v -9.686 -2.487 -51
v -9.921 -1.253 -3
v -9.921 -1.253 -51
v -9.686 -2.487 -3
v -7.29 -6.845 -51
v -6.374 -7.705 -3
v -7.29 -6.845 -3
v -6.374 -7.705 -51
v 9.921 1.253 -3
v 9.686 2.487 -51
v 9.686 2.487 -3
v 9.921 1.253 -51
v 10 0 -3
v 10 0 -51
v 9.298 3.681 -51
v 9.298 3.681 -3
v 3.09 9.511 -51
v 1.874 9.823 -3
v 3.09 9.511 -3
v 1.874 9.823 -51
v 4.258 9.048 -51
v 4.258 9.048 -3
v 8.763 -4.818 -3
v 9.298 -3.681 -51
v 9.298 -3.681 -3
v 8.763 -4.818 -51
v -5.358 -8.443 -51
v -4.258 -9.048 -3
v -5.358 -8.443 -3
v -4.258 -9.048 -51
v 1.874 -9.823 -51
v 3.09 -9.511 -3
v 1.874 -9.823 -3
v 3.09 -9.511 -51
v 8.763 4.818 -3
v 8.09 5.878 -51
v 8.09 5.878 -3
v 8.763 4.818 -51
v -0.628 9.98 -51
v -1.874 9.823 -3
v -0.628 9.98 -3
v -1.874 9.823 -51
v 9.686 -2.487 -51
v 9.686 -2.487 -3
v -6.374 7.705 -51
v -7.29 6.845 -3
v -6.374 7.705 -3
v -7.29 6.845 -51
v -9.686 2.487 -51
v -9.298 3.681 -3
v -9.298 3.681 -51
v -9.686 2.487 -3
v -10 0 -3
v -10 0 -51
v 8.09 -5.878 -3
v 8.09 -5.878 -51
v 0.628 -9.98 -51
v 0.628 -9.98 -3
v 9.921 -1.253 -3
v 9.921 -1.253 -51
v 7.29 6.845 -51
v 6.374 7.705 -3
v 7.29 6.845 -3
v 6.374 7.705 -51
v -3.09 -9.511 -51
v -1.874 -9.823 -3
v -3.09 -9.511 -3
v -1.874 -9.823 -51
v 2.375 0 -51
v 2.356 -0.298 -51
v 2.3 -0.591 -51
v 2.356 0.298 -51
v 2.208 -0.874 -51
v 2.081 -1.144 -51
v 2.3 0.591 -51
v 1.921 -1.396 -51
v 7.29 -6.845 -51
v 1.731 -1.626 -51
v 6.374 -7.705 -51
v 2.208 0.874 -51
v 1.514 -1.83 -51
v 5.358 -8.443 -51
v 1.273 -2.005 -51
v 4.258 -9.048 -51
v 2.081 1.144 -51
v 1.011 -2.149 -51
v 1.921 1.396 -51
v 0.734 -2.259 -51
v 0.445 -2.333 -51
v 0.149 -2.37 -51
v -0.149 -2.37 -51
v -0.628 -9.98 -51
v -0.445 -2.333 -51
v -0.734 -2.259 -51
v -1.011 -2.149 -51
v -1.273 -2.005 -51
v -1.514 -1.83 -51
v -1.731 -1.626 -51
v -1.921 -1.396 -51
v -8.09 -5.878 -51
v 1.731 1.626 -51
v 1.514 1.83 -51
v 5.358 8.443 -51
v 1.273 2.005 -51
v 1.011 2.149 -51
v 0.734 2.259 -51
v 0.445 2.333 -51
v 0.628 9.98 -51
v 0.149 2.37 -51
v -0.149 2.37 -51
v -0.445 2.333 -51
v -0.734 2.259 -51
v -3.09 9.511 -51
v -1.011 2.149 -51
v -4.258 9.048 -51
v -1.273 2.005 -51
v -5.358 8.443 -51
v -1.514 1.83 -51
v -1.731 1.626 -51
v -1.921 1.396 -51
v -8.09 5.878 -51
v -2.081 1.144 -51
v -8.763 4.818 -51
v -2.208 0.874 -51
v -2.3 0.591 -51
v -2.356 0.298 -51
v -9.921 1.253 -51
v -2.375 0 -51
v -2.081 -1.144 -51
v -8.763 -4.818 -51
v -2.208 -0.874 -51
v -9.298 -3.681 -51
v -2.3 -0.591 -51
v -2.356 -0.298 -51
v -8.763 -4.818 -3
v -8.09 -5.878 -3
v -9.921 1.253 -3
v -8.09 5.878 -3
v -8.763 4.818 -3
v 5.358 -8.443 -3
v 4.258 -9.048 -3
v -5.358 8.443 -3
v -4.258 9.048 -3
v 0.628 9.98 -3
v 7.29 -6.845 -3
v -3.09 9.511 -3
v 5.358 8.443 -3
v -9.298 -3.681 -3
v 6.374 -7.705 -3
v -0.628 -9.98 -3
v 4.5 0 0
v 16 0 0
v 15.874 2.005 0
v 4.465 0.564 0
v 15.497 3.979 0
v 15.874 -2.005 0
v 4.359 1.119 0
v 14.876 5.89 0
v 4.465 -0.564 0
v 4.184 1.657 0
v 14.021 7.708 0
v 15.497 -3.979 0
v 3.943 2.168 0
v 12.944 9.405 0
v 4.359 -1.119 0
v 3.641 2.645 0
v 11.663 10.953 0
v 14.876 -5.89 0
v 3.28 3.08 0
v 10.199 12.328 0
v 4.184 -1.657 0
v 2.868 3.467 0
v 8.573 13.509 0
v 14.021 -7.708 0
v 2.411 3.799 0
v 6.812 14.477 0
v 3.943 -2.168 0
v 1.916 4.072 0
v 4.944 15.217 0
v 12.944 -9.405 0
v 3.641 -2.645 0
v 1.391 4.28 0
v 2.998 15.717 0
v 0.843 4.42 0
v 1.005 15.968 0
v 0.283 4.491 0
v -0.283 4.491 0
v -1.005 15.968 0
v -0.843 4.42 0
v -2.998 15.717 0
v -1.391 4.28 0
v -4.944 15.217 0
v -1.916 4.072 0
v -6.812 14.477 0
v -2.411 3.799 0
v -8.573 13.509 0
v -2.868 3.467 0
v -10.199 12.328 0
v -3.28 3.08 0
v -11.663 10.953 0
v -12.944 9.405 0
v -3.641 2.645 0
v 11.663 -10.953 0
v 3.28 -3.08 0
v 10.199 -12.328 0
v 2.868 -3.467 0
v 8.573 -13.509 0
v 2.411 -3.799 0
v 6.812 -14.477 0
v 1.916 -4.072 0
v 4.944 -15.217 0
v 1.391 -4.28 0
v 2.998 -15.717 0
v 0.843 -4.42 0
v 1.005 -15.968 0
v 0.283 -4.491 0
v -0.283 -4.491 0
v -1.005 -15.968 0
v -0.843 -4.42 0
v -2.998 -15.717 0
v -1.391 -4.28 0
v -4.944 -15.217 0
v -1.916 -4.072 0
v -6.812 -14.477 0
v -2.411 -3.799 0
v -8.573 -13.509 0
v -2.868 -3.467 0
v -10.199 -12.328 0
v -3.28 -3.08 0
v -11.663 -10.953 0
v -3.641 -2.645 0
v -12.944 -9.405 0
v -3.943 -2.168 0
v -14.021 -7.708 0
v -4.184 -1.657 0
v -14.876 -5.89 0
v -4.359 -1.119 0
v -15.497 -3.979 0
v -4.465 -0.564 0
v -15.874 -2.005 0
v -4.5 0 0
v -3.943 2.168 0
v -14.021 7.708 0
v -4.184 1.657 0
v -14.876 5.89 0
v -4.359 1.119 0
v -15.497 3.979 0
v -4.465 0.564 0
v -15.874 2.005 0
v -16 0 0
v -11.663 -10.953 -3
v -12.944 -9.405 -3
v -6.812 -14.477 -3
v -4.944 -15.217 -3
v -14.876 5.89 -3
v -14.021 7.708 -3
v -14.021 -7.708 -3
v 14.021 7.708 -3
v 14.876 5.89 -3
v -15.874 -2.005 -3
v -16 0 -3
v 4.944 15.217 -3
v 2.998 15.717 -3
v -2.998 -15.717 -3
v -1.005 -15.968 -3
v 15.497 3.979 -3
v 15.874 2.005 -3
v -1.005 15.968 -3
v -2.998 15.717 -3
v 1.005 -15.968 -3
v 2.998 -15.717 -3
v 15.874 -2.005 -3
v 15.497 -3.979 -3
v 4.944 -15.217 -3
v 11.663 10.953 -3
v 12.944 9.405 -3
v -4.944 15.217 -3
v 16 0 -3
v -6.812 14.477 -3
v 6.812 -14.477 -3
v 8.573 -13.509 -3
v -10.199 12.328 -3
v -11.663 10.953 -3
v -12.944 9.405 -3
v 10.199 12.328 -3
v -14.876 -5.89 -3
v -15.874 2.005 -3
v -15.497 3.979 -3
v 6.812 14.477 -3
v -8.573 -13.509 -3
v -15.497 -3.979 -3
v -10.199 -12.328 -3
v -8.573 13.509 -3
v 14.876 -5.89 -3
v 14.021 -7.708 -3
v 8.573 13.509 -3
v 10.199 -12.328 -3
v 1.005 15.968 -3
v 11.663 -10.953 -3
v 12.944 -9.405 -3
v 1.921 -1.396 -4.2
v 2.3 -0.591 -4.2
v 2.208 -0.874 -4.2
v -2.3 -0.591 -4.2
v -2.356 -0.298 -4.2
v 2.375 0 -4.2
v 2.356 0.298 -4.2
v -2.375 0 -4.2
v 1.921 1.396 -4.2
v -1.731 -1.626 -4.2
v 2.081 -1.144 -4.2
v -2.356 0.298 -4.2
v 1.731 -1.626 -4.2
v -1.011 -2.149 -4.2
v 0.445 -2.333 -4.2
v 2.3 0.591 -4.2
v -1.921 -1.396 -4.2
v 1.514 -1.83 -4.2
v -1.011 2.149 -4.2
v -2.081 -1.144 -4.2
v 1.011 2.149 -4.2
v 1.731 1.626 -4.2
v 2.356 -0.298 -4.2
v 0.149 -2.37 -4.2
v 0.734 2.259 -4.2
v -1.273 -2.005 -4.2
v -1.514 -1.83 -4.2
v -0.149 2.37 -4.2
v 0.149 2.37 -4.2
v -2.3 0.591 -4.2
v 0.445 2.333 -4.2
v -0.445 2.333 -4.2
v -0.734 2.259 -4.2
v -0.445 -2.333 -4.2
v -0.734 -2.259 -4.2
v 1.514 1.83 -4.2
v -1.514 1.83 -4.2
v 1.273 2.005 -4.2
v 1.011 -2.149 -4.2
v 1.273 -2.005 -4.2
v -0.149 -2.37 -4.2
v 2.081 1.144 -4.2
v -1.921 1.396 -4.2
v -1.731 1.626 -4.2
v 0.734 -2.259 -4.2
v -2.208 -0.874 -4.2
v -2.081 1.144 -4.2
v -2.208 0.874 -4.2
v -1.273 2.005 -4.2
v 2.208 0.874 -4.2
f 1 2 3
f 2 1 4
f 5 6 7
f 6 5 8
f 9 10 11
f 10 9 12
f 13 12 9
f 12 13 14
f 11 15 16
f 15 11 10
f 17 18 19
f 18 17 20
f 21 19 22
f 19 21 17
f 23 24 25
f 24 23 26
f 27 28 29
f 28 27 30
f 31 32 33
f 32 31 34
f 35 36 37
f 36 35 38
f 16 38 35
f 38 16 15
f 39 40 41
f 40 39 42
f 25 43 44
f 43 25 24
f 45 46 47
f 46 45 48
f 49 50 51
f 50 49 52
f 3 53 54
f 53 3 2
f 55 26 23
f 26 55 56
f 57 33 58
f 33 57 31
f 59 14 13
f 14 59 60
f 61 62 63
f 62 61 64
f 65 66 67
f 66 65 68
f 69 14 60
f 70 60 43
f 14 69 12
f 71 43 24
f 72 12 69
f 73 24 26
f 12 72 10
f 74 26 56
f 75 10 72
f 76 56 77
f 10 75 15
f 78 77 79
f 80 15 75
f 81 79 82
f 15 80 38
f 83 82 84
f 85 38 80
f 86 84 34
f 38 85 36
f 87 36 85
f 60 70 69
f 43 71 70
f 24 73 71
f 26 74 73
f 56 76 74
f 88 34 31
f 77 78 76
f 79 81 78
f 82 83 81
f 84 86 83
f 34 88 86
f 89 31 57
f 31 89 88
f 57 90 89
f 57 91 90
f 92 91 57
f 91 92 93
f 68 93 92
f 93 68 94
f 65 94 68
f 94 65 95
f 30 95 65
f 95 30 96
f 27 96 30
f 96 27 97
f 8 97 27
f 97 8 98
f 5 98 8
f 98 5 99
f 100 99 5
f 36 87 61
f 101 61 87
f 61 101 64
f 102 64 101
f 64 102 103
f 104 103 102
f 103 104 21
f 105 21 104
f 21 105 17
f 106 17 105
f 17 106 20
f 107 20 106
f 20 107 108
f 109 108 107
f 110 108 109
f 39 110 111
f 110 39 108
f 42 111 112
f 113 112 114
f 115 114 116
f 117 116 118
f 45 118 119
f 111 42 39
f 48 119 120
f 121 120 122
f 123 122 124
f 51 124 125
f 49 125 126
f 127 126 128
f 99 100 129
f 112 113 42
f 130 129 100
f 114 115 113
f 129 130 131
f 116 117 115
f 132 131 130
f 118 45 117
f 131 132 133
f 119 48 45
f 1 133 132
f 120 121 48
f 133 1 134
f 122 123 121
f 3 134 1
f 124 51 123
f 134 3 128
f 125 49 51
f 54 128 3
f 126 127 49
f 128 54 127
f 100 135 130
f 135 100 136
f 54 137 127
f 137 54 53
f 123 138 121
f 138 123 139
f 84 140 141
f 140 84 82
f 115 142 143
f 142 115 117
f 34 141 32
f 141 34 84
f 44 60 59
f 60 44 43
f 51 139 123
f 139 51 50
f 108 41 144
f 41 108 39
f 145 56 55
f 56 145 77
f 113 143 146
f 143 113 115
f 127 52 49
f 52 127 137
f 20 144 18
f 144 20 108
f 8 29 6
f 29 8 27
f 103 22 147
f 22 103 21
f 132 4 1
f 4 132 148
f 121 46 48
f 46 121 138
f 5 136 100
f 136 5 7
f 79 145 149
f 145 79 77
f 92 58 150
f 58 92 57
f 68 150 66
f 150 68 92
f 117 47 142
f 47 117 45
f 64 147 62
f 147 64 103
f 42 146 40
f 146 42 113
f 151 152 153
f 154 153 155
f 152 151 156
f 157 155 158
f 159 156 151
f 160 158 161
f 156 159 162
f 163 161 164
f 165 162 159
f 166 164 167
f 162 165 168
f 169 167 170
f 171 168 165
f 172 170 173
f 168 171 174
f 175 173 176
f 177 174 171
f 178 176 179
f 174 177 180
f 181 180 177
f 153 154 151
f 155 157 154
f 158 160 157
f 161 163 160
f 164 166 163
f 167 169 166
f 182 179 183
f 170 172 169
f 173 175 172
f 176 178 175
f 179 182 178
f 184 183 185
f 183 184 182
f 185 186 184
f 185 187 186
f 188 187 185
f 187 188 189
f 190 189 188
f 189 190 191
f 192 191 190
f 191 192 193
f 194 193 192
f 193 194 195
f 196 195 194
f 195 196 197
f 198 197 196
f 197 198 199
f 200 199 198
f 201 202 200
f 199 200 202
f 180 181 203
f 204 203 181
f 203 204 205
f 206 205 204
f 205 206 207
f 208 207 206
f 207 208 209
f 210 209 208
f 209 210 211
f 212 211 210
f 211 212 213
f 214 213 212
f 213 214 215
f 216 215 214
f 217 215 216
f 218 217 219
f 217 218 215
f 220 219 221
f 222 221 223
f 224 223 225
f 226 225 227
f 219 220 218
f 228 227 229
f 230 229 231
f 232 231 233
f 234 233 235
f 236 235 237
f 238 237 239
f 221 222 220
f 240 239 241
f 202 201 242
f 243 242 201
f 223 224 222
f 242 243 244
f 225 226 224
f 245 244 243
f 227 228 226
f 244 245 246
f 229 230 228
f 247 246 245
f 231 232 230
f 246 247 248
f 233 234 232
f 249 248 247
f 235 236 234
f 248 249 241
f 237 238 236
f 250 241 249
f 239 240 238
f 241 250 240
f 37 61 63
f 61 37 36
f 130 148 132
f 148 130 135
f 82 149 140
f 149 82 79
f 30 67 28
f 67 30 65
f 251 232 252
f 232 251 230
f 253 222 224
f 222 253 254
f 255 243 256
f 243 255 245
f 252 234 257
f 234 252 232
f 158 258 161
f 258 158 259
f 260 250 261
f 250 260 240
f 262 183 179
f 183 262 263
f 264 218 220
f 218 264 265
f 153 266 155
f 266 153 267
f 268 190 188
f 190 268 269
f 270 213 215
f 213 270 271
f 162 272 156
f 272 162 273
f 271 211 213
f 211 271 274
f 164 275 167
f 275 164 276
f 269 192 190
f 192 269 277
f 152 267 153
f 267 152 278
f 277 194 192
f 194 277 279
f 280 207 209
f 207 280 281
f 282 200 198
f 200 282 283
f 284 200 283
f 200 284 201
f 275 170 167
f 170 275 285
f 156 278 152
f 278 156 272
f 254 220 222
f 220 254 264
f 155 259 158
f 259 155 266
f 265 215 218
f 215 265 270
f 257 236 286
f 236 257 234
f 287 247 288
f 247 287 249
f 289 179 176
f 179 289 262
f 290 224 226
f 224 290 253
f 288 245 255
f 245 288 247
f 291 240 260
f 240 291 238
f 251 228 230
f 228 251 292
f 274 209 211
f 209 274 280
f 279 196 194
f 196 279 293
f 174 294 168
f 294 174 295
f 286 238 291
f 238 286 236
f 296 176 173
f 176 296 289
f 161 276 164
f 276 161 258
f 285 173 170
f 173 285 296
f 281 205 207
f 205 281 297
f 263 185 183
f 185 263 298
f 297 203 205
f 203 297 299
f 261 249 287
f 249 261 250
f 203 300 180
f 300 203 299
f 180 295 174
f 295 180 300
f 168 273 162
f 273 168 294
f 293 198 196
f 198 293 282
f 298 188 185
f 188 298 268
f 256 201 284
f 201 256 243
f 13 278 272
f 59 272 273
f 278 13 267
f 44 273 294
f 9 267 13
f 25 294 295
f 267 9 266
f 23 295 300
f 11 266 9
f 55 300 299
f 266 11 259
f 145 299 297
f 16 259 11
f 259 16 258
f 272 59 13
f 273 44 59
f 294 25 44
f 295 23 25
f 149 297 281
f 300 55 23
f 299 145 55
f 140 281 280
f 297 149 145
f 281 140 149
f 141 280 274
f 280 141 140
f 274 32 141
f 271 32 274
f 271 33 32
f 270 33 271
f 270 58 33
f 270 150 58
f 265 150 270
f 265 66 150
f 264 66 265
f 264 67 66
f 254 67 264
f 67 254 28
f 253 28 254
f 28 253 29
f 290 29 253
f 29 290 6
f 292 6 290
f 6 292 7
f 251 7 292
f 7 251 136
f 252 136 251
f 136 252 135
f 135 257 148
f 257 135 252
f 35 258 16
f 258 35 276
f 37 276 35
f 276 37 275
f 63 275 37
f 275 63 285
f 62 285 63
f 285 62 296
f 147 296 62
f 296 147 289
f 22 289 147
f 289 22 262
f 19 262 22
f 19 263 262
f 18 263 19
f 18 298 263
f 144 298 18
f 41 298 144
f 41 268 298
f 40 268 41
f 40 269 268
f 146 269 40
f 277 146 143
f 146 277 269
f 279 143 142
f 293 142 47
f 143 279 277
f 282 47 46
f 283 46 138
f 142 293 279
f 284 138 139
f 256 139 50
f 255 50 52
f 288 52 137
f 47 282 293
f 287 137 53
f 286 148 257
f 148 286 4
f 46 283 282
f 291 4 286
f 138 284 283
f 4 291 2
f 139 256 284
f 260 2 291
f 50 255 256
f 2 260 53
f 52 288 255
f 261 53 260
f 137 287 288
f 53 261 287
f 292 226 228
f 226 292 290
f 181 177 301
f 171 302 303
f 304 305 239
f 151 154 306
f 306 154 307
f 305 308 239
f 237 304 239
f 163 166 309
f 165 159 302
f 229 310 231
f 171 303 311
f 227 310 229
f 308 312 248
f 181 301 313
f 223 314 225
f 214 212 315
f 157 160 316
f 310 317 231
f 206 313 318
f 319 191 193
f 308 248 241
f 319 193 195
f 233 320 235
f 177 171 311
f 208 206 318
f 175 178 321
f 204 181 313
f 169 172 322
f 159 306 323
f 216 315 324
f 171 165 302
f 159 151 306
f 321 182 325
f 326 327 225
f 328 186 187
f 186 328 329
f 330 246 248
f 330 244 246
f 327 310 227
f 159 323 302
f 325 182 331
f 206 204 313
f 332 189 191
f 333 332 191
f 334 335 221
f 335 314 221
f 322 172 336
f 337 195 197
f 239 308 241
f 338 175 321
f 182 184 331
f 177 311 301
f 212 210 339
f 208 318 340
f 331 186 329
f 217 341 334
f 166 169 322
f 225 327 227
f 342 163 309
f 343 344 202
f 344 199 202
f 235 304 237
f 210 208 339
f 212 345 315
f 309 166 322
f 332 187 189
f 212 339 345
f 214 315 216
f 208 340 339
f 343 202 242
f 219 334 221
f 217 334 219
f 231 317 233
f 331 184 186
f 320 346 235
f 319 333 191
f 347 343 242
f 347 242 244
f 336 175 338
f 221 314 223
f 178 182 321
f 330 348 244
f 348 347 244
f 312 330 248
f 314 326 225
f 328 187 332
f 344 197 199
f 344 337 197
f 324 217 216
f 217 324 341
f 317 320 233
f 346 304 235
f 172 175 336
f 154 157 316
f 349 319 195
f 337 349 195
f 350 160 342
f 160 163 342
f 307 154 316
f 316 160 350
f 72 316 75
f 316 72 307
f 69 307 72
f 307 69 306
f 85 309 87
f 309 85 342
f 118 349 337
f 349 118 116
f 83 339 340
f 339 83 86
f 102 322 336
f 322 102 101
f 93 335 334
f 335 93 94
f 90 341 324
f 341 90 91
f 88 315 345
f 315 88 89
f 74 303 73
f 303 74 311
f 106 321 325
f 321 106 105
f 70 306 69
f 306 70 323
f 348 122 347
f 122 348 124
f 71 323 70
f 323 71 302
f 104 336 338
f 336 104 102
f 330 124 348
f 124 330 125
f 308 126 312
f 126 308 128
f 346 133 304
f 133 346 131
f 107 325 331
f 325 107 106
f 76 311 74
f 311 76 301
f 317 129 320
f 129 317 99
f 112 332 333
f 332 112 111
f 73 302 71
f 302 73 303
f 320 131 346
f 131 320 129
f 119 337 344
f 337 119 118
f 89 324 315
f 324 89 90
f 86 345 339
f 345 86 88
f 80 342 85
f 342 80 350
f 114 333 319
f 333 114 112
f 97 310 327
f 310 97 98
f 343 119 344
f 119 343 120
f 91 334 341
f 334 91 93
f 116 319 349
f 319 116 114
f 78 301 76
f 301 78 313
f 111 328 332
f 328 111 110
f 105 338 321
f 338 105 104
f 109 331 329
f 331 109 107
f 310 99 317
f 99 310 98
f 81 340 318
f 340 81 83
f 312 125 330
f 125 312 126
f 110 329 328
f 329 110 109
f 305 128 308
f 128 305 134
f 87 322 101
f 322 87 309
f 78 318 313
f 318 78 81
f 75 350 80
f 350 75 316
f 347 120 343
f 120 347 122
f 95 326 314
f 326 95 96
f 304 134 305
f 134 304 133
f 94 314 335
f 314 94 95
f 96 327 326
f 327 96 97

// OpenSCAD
$fn = 50;


difference() {
	union() {
		translate(v = [0, 0, -51.0000000000]) {
			cylinder(h = 51, r = 10.0000000000);
		}
		translate(v = [0, 0, -3.0000000000]) {
			cylinder(h = 3, r = 16.0000000000);
		}
	}
	union() {
		translate(v = [0, 0, 0]) {
			rotate(a = [0, 0, 0]) {
				difference() {
					union() {
						#translate(v = [0, 0, -51.0000000000]) {
							cylinder(h = 51, r = 2.2500000000);
						}
						#translate(v = [0, 0, -4.2000000000]) {
							cylinder(h = 4.2000000000, r1 = 2.3750000000, r2 = 4.5000000000);
						}
						#translate(v = [0, 0, -51.0000000000]) {
							cylinder(h = 51, r = 2.3750000000);
						}
						#translate(v = [0, 0, -51.0000000000]) {
							cylinder(h = 51, r = 2.2500000000);
						}
					}
					union();
				}
			}
		}
	}
}
